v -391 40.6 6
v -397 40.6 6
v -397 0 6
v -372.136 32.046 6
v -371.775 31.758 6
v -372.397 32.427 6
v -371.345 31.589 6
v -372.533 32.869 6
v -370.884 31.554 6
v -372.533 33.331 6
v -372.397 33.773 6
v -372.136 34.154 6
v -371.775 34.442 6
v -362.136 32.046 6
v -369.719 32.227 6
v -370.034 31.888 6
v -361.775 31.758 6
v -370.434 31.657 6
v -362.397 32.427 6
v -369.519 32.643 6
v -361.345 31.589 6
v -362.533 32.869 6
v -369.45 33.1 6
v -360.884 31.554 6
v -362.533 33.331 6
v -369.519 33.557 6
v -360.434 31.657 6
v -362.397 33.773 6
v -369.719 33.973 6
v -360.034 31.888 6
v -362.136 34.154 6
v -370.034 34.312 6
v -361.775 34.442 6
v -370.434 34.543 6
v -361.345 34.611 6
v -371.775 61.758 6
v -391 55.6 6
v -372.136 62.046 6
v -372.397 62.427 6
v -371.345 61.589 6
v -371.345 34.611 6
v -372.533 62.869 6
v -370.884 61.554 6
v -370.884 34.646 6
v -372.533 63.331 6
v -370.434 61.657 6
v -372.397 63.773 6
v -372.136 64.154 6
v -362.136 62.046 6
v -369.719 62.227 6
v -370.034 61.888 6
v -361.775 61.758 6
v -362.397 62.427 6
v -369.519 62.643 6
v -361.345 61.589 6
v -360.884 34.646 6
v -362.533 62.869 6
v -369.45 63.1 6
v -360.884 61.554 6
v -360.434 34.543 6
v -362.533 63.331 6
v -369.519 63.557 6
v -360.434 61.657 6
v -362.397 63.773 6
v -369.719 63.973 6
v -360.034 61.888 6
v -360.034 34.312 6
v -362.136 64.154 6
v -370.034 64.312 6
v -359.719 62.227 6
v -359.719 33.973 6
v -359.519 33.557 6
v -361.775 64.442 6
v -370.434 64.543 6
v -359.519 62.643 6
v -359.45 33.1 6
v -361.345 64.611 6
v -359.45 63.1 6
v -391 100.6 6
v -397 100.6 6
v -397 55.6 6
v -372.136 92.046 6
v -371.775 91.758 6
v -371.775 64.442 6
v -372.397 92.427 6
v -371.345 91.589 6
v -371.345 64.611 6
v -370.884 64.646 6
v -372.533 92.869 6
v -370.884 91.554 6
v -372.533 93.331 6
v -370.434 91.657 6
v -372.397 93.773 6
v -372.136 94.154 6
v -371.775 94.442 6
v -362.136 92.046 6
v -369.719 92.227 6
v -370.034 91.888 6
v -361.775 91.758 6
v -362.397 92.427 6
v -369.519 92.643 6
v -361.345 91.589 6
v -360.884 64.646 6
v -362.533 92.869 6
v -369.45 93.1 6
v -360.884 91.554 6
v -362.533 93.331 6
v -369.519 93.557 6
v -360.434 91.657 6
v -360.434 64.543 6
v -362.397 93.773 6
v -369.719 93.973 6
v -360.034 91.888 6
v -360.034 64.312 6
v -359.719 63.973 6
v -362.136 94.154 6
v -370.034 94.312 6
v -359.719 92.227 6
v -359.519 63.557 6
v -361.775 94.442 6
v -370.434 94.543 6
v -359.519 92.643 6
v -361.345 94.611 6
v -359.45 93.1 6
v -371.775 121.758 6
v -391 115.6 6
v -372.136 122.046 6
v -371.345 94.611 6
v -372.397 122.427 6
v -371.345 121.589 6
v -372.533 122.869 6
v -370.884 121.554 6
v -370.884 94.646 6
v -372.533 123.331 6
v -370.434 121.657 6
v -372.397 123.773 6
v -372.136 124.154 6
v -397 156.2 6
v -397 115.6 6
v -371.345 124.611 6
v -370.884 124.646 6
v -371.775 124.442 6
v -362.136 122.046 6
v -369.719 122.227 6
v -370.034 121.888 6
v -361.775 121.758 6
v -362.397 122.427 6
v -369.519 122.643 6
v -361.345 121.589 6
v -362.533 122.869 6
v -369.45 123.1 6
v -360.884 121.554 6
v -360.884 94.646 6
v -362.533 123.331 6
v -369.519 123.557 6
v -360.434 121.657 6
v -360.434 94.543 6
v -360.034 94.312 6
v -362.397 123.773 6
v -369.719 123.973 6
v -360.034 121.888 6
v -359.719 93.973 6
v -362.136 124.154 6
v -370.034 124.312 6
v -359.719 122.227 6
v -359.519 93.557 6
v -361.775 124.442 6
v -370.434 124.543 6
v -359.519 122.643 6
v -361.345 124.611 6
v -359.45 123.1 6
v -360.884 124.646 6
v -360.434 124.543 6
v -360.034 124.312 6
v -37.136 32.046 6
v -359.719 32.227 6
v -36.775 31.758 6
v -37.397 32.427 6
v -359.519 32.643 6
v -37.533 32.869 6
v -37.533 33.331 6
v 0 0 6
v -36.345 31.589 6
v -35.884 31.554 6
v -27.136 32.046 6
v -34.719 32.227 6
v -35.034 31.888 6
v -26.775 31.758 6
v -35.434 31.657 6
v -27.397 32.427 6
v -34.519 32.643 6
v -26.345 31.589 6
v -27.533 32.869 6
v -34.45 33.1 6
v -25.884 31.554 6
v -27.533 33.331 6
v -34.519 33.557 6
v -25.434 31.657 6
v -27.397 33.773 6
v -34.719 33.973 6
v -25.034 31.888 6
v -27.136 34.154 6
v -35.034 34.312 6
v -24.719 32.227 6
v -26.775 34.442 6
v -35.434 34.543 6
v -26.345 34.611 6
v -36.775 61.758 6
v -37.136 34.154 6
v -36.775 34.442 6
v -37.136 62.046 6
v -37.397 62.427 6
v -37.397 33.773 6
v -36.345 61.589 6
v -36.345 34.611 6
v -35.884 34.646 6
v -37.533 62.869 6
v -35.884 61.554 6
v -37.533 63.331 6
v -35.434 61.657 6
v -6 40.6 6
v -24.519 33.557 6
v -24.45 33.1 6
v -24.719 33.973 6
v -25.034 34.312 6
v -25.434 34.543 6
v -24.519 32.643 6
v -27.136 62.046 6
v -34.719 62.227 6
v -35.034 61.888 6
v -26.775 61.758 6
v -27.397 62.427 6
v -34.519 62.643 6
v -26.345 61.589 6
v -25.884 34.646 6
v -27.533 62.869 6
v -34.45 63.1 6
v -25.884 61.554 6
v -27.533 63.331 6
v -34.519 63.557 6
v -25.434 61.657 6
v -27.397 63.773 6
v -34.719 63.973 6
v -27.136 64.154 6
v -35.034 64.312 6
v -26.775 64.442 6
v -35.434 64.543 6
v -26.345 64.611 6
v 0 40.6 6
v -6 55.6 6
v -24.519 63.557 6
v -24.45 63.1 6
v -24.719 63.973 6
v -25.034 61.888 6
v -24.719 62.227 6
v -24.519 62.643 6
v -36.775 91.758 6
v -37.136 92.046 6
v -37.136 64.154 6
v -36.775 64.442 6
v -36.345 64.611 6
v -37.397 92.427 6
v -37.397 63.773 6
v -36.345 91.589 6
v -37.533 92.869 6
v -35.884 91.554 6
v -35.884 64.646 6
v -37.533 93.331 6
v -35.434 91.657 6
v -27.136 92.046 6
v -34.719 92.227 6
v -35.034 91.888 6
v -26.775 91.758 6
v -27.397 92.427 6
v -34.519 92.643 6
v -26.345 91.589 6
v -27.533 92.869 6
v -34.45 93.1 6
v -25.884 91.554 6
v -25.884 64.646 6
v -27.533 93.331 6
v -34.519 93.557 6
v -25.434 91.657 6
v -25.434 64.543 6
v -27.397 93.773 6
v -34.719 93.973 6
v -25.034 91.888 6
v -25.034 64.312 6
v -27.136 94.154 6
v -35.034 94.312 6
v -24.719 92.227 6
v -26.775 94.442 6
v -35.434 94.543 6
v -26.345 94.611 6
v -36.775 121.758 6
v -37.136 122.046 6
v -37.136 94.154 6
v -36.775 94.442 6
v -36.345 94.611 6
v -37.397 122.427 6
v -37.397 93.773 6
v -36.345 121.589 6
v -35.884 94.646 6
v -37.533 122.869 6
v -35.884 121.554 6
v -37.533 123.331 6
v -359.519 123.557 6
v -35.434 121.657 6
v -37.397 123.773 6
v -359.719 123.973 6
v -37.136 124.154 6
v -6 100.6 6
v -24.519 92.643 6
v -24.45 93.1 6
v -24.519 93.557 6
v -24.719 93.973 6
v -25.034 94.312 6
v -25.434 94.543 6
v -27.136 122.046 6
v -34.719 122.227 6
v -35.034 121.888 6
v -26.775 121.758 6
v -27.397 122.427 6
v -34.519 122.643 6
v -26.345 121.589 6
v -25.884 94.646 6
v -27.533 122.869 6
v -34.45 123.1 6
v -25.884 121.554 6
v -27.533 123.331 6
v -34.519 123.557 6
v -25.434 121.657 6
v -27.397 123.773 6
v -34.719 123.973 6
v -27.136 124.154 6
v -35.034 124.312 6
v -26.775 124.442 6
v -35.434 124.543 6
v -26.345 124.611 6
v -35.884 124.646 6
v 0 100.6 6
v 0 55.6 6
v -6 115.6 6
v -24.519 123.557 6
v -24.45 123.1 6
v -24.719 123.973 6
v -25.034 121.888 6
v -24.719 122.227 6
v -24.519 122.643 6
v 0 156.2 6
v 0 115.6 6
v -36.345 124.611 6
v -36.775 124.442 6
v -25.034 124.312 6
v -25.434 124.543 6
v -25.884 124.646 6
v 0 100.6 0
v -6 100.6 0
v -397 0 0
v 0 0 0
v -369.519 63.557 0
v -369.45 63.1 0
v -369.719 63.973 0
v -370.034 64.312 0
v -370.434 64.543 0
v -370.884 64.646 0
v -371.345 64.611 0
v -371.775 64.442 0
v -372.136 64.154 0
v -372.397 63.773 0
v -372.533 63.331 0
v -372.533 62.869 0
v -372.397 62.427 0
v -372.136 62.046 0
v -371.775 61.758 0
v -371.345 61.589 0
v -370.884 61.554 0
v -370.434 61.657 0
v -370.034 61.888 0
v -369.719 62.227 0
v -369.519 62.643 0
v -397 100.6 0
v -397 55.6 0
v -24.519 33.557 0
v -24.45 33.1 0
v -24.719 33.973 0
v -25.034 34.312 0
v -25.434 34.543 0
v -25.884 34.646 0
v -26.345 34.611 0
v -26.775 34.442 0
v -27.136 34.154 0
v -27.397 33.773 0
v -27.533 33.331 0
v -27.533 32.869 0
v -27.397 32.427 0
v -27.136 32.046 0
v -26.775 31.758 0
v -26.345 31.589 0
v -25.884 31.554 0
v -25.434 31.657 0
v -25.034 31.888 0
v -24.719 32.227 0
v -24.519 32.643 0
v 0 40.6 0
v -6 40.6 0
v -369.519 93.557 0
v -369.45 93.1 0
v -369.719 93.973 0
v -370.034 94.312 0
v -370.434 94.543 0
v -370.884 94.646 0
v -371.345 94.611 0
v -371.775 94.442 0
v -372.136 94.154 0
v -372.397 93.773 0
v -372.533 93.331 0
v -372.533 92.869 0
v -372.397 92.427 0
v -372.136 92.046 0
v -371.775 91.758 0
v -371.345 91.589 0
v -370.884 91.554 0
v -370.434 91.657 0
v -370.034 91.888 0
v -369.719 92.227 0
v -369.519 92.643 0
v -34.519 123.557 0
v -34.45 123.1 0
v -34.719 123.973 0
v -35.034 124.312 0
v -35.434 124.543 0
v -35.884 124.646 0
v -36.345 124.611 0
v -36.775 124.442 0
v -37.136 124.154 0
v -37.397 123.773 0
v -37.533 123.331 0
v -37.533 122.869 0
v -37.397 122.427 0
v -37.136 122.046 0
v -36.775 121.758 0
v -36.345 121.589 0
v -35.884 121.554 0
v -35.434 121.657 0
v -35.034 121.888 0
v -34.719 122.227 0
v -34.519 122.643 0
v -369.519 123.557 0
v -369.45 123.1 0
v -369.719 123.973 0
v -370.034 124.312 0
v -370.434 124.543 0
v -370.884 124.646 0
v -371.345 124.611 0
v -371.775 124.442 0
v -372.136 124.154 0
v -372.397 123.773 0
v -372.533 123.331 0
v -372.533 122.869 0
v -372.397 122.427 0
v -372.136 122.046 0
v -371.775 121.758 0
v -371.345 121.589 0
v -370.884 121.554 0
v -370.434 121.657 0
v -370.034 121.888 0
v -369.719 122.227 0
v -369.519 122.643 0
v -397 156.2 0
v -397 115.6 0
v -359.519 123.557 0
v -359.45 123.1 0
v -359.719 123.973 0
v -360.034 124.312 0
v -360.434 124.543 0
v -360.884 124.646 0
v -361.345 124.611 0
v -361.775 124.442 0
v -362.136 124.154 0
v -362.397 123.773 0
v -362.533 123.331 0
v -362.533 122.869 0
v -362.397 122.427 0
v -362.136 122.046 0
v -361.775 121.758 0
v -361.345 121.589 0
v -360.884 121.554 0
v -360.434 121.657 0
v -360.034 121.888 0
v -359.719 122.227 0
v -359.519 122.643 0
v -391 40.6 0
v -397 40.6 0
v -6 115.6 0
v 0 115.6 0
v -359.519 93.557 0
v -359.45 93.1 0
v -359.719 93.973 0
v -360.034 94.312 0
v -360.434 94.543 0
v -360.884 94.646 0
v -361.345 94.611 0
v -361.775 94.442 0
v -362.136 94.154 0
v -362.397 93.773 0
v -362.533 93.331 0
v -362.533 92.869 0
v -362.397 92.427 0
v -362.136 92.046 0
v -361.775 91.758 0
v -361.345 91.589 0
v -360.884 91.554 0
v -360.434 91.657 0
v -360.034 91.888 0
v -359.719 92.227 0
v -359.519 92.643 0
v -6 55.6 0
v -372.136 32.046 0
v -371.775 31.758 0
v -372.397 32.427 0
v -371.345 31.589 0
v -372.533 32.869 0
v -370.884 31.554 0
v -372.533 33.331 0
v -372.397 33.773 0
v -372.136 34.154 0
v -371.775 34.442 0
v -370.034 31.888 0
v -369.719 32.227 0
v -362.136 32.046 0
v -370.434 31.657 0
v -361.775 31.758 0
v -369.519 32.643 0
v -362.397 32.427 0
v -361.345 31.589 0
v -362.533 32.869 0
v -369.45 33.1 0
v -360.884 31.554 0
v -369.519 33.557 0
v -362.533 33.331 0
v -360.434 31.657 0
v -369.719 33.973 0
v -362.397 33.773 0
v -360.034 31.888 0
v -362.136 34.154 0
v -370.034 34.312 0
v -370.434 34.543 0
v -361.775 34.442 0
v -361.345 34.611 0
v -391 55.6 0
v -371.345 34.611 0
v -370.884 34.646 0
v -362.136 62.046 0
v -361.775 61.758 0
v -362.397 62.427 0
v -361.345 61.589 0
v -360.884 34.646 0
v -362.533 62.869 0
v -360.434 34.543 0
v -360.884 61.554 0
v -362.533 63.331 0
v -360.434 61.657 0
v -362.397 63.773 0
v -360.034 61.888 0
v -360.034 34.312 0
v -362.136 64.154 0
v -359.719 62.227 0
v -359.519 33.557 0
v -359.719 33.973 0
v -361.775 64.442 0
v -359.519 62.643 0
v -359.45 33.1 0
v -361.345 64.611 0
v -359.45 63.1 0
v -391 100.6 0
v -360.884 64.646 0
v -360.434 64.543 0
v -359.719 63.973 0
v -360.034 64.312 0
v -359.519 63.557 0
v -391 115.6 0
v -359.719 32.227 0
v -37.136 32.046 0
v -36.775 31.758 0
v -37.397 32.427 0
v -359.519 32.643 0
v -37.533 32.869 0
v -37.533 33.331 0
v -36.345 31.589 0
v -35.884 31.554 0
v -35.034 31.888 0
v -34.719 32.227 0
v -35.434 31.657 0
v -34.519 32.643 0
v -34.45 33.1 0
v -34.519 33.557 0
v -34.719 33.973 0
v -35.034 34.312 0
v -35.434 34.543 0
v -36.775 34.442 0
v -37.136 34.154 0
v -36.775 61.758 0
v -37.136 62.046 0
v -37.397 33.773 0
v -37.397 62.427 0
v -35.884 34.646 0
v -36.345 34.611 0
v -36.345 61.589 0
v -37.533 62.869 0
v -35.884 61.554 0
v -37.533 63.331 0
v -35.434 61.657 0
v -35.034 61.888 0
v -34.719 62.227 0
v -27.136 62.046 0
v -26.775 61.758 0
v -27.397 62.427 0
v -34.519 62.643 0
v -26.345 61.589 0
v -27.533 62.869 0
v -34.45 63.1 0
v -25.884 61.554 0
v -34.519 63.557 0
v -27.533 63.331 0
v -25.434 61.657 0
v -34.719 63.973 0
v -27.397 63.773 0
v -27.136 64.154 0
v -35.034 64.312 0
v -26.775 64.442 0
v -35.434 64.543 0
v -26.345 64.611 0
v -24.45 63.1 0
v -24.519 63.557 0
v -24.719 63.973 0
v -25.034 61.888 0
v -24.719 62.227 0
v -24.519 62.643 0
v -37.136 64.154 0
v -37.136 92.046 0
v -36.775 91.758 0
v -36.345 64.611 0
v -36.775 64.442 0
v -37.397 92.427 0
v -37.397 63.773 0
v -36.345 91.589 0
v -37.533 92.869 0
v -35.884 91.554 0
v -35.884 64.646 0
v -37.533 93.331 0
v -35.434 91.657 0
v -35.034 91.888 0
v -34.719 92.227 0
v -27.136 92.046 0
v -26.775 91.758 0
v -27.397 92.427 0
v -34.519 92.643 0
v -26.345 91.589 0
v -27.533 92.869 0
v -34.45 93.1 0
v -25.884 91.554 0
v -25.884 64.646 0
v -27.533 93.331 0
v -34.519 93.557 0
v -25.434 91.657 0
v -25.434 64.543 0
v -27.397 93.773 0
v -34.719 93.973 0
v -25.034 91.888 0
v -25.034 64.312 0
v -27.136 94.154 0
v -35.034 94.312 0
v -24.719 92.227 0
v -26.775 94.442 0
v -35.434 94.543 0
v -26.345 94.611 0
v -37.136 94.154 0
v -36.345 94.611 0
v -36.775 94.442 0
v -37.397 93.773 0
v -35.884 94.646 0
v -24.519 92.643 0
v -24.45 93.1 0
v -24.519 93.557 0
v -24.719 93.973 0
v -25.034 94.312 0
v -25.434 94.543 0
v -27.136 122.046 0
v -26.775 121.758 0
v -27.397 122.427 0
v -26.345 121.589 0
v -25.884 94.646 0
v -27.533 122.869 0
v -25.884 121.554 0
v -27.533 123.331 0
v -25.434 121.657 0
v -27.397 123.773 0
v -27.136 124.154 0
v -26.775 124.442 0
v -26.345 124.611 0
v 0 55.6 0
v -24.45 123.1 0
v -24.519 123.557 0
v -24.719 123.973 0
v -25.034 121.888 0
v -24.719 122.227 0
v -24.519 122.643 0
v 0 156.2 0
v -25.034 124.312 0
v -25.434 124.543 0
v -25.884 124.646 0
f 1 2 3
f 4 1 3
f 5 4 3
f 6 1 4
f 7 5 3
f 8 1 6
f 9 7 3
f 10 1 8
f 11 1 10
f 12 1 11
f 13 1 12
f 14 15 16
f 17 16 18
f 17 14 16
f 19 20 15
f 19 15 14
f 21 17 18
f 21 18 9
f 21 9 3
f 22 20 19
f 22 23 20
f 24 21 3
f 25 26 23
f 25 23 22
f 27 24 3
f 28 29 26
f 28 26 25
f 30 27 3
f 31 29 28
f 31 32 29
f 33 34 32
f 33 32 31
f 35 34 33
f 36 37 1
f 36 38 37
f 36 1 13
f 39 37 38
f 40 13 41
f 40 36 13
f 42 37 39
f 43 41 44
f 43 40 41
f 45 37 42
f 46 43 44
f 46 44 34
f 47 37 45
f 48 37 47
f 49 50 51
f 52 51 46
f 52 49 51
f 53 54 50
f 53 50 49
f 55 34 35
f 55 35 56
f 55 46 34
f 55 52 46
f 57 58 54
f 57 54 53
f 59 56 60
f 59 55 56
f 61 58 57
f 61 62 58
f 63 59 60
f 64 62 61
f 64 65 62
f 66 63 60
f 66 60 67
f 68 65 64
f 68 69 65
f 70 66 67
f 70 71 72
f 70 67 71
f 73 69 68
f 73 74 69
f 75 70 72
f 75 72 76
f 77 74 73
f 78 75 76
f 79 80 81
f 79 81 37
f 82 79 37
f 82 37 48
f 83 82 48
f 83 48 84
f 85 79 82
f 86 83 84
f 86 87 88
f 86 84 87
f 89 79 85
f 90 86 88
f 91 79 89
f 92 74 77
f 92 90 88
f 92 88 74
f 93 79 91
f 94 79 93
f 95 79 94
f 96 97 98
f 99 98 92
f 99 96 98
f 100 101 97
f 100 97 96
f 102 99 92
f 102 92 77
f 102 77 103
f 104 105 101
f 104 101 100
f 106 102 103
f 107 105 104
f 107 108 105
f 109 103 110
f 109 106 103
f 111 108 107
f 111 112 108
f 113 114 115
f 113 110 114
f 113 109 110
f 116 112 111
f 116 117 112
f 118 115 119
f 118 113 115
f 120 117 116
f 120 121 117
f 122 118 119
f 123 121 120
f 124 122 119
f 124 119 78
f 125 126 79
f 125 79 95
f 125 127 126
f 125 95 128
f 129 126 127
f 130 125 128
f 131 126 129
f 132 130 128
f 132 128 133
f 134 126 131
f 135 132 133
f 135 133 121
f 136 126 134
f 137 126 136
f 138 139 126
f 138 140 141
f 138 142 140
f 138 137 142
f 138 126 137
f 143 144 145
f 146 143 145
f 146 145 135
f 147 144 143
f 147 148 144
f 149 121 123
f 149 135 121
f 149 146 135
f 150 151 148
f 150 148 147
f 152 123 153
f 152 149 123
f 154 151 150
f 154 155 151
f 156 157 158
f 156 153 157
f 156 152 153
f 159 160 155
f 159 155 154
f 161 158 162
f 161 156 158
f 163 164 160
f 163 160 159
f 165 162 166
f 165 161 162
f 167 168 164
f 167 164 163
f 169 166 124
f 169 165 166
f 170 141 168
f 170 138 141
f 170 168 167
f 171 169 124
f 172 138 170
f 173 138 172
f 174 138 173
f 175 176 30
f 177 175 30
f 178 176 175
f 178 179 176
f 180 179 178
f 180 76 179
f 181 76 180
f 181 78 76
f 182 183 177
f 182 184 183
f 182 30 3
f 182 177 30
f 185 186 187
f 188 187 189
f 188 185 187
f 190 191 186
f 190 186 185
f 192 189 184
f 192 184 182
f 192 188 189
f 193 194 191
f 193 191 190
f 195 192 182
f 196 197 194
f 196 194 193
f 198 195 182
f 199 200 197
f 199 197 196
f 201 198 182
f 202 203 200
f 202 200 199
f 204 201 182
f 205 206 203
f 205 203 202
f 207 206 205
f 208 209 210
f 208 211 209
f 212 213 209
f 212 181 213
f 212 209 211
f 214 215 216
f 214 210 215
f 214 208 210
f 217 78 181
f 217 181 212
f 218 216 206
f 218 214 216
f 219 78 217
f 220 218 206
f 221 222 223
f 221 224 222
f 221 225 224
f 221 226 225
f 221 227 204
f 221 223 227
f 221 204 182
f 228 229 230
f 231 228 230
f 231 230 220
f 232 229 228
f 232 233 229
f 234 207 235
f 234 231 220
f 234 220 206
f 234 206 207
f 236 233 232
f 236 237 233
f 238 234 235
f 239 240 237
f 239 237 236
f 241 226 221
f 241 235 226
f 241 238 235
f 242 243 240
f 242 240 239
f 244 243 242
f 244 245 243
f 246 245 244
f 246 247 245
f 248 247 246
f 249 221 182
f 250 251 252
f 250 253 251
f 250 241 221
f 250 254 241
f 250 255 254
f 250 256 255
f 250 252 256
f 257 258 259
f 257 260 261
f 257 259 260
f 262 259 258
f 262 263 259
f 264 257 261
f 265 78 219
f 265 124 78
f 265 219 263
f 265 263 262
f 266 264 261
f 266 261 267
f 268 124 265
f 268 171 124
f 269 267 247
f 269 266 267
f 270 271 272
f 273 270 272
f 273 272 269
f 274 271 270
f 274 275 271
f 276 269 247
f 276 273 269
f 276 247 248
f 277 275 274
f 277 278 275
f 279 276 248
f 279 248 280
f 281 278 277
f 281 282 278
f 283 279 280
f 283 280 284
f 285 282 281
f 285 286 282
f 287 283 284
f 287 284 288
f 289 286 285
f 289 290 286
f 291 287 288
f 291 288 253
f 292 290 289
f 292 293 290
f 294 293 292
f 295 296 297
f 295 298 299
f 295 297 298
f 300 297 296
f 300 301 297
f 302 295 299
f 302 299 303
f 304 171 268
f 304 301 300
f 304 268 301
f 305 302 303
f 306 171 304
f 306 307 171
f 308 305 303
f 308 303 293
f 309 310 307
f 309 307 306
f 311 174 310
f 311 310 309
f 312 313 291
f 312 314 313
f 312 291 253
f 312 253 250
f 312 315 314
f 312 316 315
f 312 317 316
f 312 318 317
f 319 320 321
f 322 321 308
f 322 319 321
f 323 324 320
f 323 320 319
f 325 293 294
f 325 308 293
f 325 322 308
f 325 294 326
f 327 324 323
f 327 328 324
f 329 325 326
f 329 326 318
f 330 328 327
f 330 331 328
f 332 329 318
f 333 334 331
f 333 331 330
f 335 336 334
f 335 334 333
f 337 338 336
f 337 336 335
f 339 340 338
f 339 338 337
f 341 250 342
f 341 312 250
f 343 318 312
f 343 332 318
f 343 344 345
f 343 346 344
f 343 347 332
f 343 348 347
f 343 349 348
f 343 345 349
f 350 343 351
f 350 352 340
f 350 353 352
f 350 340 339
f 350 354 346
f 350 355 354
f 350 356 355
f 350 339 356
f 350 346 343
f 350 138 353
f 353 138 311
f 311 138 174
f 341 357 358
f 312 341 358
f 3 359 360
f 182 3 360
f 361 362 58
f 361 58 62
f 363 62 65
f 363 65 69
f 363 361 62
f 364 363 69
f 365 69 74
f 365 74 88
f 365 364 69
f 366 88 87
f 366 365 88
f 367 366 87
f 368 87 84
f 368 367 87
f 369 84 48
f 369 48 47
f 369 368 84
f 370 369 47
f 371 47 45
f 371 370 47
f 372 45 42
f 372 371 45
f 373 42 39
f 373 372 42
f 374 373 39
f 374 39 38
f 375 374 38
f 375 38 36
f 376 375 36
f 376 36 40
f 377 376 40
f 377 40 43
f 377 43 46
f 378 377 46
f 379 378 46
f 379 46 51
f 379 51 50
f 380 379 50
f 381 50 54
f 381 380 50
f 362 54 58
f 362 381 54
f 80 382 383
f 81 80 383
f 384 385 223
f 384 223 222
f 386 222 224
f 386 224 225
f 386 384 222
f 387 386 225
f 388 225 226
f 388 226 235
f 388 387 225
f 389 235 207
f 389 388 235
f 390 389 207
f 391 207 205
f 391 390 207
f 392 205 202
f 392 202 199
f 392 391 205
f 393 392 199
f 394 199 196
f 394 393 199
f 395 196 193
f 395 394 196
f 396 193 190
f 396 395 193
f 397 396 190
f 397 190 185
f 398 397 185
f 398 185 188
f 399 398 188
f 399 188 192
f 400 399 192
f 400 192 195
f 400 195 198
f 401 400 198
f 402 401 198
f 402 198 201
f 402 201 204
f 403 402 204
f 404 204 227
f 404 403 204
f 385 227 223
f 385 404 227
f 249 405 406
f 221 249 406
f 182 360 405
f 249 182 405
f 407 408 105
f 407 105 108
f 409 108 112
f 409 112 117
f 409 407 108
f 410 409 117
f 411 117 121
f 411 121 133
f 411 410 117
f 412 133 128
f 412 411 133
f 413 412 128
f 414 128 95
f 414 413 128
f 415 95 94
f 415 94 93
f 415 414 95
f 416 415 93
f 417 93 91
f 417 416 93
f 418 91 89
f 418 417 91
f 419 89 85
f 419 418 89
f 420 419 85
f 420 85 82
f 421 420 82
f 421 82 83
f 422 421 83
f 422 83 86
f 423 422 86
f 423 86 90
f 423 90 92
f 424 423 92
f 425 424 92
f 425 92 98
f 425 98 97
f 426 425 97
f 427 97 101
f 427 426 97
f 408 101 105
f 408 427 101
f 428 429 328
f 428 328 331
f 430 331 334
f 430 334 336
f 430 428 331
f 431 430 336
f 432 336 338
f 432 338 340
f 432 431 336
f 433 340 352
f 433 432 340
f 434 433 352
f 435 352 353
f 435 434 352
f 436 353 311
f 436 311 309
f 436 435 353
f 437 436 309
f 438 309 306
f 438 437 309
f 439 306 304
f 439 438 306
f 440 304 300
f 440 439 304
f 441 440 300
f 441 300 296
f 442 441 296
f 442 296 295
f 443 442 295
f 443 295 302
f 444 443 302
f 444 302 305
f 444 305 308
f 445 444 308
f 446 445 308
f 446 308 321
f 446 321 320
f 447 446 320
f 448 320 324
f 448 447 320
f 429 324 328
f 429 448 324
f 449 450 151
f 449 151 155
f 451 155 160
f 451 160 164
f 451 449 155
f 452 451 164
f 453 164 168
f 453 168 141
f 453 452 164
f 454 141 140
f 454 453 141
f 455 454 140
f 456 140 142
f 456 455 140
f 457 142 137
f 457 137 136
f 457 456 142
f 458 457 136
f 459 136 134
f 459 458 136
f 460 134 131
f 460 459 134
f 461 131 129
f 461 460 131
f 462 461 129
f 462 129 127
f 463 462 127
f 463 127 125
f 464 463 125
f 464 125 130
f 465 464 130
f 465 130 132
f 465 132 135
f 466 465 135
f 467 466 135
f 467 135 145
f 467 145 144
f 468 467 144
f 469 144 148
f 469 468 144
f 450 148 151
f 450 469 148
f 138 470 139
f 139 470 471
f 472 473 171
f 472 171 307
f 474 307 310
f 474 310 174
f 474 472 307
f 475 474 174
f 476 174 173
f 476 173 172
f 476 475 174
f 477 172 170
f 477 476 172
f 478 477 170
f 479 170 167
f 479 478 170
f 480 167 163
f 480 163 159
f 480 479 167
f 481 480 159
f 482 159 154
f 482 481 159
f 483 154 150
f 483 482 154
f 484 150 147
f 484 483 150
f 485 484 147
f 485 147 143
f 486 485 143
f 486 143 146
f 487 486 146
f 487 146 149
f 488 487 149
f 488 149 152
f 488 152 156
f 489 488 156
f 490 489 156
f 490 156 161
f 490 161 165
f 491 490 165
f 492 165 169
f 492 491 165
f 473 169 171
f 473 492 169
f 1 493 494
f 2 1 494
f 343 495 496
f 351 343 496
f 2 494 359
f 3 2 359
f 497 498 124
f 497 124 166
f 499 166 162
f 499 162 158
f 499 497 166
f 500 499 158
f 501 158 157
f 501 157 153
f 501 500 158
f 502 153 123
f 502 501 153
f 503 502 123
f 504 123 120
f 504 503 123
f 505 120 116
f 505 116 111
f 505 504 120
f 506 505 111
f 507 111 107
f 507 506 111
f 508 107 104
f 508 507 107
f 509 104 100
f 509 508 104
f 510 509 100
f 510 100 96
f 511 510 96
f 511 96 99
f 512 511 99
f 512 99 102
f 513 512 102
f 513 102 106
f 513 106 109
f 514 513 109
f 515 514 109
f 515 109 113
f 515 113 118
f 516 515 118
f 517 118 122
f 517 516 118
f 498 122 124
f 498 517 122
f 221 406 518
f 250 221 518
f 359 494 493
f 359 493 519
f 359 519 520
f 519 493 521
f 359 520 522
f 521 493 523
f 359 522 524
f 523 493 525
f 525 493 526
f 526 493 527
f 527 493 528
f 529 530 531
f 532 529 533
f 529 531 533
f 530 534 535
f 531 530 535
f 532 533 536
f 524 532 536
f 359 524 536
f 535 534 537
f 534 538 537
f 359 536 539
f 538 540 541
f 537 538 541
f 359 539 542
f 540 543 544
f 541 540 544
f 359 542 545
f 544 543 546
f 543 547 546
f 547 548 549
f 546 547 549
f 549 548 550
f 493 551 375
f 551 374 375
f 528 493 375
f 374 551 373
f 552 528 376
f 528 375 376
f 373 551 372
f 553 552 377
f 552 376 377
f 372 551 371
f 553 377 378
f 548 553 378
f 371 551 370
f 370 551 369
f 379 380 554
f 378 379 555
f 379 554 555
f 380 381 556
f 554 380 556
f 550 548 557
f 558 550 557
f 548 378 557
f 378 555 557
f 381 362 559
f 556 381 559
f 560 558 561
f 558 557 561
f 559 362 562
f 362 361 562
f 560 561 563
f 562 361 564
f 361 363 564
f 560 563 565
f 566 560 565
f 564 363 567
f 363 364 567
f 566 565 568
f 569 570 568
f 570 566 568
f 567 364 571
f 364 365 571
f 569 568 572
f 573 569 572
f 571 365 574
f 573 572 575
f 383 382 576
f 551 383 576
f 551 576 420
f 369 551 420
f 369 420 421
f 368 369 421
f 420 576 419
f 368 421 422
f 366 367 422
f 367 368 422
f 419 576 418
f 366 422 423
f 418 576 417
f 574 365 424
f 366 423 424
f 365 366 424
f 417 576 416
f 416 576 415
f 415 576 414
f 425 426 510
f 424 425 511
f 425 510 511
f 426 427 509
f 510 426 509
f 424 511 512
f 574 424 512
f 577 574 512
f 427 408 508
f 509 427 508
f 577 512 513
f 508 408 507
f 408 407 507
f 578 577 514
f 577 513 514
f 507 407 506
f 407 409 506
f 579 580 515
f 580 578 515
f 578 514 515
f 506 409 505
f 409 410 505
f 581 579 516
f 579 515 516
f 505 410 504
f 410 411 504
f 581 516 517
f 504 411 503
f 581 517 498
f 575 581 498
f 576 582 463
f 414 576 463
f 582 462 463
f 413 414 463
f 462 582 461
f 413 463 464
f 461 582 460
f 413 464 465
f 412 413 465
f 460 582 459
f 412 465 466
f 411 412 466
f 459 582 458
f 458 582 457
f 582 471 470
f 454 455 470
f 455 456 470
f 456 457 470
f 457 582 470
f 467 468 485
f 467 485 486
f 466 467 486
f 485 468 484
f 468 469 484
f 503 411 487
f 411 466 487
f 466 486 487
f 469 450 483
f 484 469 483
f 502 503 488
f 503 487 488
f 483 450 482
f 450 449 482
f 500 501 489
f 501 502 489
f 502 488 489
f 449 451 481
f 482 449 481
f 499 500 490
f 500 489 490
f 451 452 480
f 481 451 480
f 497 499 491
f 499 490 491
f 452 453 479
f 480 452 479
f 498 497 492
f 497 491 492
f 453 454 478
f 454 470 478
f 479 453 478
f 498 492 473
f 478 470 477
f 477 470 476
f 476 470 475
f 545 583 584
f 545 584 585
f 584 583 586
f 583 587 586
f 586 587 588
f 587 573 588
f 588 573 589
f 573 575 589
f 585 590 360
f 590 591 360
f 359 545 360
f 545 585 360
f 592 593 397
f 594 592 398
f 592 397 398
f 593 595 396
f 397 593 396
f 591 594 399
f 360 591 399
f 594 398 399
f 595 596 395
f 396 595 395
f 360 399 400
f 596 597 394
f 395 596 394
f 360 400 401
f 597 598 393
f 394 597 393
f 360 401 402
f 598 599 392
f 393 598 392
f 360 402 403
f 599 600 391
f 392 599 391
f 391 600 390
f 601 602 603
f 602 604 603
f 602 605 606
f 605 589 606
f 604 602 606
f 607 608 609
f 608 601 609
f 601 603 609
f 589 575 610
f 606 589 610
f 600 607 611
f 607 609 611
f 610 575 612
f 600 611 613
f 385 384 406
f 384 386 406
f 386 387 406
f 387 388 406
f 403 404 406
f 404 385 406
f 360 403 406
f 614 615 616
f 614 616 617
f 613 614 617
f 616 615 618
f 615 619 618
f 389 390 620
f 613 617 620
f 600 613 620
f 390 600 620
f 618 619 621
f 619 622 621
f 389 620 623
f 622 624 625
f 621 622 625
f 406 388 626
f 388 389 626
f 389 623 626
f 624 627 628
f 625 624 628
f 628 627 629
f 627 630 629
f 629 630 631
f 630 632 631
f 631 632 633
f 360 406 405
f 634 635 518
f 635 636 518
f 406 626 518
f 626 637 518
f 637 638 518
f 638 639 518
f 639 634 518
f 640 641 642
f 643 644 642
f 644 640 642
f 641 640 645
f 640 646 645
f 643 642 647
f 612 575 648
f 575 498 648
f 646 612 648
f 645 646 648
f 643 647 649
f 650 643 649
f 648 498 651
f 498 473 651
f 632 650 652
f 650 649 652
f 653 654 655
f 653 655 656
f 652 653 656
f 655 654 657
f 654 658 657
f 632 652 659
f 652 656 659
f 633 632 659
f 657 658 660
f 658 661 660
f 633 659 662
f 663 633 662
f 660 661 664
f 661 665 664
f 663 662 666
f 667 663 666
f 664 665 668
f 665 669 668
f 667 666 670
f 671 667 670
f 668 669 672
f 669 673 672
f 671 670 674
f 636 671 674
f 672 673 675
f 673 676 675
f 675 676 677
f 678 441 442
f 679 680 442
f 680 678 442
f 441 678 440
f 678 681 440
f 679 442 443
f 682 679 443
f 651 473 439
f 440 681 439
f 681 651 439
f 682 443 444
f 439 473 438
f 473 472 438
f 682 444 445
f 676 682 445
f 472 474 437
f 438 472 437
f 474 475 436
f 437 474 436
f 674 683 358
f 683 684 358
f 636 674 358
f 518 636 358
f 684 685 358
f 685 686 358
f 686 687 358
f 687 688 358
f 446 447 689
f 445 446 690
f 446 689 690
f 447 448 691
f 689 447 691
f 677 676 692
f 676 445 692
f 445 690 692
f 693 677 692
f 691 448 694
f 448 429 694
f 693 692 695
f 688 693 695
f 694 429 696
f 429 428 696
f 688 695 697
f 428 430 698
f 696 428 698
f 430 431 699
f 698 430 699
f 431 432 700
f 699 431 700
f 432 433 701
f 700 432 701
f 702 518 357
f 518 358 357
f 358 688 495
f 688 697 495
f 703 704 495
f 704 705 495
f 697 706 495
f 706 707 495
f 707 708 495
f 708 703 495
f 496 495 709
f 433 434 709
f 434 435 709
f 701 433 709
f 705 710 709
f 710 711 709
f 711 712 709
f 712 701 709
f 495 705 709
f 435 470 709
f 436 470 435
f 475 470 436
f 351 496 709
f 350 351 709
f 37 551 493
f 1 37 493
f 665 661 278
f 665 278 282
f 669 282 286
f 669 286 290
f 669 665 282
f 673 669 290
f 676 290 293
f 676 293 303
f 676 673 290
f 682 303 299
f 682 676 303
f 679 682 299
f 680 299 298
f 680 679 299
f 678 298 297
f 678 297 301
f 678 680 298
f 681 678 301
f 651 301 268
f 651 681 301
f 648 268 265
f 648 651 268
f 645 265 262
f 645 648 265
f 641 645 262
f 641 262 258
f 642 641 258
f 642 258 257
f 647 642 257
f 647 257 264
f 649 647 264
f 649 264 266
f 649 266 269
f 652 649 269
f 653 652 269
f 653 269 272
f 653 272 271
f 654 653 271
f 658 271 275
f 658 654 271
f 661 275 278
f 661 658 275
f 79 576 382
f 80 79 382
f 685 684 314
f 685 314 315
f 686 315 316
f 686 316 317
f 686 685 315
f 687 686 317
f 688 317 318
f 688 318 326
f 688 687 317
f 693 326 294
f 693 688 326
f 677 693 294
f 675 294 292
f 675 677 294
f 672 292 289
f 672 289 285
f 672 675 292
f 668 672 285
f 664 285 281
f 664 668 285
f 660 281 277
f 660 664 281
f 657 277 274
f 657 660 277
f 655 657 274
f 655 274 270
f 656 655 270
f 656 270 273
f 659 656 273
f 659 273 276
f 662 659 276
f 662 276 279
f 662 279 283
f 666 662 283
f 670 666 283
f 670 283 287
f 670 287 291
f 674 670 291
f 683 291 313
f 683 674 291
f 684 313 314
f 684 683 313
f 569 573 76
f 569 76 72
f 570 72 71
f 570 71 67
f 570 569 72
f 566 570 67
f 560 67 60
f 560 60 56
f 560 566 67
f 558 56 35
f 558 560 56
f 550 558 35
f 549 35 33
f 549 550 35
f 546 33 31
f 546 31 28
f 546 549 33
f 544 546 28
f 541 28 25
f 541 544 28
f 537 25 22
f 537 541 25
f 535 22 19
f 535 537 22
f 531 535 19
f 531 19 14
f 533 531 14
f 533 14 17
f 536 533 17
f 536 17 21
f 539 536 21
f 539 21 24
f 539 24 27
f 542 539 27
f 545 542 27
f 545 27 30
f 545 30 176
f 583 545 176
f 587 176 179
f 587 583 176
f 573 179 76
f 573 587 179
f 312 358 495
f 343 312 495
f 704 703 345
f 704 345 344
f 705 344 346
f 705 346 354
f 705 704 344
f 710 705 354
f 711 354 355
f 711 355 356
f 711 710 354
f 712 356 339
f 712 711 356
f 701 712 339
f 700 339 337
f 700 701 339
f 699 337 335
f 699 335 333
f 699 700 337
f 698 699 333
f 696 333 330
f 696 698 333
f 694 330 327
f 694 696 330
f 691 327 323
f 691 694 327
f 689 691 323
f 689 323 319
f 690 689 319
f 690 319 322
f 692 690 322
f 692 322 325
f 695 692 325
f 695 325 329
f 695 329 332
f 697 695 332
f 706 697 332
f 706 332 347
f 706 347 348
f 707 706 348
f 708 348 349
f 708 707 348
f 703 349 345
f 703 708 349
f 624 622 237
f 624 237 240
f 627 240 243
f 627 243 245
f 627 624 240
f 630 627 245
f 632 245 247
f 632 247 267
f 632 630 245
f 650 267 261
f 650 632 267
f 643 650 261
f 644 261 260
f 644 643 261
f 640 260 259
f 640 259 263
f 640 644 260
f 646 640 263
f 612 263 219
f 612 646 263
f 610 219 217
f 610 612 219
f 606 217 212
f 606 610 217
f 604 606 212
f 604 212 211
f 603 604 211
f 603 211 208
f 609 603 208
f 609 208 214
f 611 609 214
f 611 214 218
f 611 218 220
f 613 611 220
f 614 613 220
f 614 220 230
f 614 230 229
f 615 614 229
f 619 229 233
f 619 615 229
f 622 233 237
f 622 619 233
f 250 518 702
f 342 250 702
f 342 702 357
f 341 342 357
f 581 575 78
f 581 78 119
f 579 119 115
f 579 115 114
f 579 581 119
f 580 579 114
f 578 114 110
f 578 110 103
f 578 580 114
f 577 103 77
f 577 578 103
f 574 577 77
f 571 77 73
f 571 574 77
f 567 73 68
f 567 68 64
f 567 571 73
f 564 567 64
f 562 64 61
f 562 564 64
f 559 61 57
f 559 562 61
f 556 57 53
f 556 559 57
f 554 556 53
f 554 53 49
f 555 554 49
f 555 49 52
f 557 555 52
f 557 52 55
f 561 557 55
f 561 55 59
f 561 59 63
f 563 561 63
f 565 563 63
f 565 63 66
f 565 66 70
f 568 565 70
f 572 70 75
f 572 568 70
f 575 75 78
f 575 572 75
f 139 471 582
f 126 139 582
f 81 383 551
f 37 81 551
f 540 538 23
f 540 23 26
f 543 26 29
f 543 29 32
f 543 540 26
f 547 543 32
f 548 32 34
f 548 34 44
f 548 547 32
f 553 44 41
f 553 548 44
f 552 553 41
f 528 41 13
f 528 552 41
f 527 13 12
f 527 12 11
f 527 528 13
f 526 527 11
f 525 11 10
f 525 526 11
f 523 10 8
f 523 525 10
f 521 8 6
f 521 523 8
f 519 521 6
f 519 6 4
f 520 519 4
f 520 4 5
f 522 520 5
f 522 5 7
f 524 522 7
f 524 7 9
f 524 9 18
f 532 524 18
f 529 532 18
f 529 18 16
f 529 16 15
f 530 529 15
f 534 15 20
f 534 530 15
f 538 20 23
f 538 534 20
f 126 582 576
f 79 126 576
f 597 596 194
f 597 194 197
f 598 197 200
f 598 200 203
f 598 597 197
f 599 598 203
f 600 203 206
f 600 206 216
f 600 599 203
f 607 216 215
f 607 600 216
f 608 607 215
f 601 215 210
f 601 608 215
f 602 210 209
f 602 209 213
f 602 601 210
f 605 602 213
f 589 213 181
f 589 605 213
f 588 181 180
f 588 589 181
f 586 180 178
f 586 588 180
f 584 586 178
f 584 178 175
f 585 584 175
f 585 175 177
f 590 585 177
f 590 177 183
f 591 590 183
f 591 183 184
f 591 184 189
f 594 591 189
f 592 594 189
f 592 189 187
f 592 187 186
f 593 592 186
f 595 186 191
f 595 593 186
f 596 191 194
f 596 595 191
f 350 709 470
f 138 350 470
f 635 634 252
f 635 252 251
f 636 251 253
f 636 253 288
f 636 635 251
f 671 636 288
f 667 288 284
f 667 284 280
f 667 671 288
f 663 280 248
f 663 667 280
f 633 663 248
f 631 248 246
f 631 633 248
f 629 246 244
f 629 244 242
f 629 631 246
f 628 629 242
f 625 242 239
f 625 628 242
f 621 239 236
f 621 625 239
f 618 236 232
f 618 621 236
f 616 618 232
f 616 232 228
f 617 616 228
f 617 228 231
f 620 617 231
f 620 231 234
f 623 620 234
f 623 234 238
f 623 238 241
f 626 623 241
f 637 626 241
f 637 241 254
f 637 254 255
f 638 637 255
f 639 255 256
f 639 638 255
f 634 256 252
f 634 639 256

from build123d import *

# Parameters (mm, degrees)
F0_R     = 1.55
F1_DEPTH = 6


with BuildPart() as f1:
    # F0 (on Top) → F1 (new body)
    with BuildSketch(Plane.XY):
        Polygon((-397, 0), (0, 0), (0, 40.6), (-6, 40.6), (-6, 55.6), (0, 55.6), (0, 100.6), (-6, 100.6), (-6, 115.6), (0, 115.6), (0, 156.2), (-397, 156.2), (-397, 115.6), (-391, 115.6), (-391, 100.6), (-397, 100.6), (-397, 55.6), (-391, 55.6), (-391, 40.6), (-397, 40.6), align=None)
        with Locations((-371, 33.1)):
            Circle(F0_R, mode=Mode.SUBTRACT)
        with Locations((-361, 33.1)):
            Circle(F0_R, mode=Mode.SUBTRACT)
        with Locations((-371, 63.1)):
            Circle(F0_R, mode=Mode.SUBTRACT)
        with Locations((-361, 63.1)):
            Circle(F0_R, mode=Mode.SUBTRACT)
        with Locations((-36, 33.1)):
            Circle(F0_R, mode=Mode.SUBTRACT)
        with Locations((-26, 33.1)):
            Circle(F0_R, mode=Mode.SUBTRACT)
        with Locations((-36, 63.1)):
            Circle(F0_R, mode=Mode.SUBTRACT)
        with Locations((-26, 63.1)):
            Circle(F0_R, mode=Mode.SUBTRACT)
        with Locations((-371, 93.1)):
            Circle(F0_R, mode=Mode.SUBTRACT)
        with Locations((-361, 93.1)):
            Circle(F0_R, mode=Mode.SUBTRACT)
        with Locations((-371, 123.1)):
            Circle(F0_R, mode=Mode.SUBTRACT)
        with Locations((-361, 123.1)):
            Circle(F0_R, mode=Mode.SUBTRACT)
        with Locations((-36, 93.1)):
            Circle(F0_R, mode=Mode.SUBTRACT)
        with Locations((-26, 93.1)):
            Circle(F0_R, mode=Mode.SUBTRACT)
        with Locations((-36, 123.1)):
            Circle(F0_R, mode=Mode.SUBTRACT)
        with Locations((-26, 123.1)):
            Circle(F0_R, mode=Mode.SUBTRACT)
    extrude(amount=F1_DEPTH)


solid = f1.part
